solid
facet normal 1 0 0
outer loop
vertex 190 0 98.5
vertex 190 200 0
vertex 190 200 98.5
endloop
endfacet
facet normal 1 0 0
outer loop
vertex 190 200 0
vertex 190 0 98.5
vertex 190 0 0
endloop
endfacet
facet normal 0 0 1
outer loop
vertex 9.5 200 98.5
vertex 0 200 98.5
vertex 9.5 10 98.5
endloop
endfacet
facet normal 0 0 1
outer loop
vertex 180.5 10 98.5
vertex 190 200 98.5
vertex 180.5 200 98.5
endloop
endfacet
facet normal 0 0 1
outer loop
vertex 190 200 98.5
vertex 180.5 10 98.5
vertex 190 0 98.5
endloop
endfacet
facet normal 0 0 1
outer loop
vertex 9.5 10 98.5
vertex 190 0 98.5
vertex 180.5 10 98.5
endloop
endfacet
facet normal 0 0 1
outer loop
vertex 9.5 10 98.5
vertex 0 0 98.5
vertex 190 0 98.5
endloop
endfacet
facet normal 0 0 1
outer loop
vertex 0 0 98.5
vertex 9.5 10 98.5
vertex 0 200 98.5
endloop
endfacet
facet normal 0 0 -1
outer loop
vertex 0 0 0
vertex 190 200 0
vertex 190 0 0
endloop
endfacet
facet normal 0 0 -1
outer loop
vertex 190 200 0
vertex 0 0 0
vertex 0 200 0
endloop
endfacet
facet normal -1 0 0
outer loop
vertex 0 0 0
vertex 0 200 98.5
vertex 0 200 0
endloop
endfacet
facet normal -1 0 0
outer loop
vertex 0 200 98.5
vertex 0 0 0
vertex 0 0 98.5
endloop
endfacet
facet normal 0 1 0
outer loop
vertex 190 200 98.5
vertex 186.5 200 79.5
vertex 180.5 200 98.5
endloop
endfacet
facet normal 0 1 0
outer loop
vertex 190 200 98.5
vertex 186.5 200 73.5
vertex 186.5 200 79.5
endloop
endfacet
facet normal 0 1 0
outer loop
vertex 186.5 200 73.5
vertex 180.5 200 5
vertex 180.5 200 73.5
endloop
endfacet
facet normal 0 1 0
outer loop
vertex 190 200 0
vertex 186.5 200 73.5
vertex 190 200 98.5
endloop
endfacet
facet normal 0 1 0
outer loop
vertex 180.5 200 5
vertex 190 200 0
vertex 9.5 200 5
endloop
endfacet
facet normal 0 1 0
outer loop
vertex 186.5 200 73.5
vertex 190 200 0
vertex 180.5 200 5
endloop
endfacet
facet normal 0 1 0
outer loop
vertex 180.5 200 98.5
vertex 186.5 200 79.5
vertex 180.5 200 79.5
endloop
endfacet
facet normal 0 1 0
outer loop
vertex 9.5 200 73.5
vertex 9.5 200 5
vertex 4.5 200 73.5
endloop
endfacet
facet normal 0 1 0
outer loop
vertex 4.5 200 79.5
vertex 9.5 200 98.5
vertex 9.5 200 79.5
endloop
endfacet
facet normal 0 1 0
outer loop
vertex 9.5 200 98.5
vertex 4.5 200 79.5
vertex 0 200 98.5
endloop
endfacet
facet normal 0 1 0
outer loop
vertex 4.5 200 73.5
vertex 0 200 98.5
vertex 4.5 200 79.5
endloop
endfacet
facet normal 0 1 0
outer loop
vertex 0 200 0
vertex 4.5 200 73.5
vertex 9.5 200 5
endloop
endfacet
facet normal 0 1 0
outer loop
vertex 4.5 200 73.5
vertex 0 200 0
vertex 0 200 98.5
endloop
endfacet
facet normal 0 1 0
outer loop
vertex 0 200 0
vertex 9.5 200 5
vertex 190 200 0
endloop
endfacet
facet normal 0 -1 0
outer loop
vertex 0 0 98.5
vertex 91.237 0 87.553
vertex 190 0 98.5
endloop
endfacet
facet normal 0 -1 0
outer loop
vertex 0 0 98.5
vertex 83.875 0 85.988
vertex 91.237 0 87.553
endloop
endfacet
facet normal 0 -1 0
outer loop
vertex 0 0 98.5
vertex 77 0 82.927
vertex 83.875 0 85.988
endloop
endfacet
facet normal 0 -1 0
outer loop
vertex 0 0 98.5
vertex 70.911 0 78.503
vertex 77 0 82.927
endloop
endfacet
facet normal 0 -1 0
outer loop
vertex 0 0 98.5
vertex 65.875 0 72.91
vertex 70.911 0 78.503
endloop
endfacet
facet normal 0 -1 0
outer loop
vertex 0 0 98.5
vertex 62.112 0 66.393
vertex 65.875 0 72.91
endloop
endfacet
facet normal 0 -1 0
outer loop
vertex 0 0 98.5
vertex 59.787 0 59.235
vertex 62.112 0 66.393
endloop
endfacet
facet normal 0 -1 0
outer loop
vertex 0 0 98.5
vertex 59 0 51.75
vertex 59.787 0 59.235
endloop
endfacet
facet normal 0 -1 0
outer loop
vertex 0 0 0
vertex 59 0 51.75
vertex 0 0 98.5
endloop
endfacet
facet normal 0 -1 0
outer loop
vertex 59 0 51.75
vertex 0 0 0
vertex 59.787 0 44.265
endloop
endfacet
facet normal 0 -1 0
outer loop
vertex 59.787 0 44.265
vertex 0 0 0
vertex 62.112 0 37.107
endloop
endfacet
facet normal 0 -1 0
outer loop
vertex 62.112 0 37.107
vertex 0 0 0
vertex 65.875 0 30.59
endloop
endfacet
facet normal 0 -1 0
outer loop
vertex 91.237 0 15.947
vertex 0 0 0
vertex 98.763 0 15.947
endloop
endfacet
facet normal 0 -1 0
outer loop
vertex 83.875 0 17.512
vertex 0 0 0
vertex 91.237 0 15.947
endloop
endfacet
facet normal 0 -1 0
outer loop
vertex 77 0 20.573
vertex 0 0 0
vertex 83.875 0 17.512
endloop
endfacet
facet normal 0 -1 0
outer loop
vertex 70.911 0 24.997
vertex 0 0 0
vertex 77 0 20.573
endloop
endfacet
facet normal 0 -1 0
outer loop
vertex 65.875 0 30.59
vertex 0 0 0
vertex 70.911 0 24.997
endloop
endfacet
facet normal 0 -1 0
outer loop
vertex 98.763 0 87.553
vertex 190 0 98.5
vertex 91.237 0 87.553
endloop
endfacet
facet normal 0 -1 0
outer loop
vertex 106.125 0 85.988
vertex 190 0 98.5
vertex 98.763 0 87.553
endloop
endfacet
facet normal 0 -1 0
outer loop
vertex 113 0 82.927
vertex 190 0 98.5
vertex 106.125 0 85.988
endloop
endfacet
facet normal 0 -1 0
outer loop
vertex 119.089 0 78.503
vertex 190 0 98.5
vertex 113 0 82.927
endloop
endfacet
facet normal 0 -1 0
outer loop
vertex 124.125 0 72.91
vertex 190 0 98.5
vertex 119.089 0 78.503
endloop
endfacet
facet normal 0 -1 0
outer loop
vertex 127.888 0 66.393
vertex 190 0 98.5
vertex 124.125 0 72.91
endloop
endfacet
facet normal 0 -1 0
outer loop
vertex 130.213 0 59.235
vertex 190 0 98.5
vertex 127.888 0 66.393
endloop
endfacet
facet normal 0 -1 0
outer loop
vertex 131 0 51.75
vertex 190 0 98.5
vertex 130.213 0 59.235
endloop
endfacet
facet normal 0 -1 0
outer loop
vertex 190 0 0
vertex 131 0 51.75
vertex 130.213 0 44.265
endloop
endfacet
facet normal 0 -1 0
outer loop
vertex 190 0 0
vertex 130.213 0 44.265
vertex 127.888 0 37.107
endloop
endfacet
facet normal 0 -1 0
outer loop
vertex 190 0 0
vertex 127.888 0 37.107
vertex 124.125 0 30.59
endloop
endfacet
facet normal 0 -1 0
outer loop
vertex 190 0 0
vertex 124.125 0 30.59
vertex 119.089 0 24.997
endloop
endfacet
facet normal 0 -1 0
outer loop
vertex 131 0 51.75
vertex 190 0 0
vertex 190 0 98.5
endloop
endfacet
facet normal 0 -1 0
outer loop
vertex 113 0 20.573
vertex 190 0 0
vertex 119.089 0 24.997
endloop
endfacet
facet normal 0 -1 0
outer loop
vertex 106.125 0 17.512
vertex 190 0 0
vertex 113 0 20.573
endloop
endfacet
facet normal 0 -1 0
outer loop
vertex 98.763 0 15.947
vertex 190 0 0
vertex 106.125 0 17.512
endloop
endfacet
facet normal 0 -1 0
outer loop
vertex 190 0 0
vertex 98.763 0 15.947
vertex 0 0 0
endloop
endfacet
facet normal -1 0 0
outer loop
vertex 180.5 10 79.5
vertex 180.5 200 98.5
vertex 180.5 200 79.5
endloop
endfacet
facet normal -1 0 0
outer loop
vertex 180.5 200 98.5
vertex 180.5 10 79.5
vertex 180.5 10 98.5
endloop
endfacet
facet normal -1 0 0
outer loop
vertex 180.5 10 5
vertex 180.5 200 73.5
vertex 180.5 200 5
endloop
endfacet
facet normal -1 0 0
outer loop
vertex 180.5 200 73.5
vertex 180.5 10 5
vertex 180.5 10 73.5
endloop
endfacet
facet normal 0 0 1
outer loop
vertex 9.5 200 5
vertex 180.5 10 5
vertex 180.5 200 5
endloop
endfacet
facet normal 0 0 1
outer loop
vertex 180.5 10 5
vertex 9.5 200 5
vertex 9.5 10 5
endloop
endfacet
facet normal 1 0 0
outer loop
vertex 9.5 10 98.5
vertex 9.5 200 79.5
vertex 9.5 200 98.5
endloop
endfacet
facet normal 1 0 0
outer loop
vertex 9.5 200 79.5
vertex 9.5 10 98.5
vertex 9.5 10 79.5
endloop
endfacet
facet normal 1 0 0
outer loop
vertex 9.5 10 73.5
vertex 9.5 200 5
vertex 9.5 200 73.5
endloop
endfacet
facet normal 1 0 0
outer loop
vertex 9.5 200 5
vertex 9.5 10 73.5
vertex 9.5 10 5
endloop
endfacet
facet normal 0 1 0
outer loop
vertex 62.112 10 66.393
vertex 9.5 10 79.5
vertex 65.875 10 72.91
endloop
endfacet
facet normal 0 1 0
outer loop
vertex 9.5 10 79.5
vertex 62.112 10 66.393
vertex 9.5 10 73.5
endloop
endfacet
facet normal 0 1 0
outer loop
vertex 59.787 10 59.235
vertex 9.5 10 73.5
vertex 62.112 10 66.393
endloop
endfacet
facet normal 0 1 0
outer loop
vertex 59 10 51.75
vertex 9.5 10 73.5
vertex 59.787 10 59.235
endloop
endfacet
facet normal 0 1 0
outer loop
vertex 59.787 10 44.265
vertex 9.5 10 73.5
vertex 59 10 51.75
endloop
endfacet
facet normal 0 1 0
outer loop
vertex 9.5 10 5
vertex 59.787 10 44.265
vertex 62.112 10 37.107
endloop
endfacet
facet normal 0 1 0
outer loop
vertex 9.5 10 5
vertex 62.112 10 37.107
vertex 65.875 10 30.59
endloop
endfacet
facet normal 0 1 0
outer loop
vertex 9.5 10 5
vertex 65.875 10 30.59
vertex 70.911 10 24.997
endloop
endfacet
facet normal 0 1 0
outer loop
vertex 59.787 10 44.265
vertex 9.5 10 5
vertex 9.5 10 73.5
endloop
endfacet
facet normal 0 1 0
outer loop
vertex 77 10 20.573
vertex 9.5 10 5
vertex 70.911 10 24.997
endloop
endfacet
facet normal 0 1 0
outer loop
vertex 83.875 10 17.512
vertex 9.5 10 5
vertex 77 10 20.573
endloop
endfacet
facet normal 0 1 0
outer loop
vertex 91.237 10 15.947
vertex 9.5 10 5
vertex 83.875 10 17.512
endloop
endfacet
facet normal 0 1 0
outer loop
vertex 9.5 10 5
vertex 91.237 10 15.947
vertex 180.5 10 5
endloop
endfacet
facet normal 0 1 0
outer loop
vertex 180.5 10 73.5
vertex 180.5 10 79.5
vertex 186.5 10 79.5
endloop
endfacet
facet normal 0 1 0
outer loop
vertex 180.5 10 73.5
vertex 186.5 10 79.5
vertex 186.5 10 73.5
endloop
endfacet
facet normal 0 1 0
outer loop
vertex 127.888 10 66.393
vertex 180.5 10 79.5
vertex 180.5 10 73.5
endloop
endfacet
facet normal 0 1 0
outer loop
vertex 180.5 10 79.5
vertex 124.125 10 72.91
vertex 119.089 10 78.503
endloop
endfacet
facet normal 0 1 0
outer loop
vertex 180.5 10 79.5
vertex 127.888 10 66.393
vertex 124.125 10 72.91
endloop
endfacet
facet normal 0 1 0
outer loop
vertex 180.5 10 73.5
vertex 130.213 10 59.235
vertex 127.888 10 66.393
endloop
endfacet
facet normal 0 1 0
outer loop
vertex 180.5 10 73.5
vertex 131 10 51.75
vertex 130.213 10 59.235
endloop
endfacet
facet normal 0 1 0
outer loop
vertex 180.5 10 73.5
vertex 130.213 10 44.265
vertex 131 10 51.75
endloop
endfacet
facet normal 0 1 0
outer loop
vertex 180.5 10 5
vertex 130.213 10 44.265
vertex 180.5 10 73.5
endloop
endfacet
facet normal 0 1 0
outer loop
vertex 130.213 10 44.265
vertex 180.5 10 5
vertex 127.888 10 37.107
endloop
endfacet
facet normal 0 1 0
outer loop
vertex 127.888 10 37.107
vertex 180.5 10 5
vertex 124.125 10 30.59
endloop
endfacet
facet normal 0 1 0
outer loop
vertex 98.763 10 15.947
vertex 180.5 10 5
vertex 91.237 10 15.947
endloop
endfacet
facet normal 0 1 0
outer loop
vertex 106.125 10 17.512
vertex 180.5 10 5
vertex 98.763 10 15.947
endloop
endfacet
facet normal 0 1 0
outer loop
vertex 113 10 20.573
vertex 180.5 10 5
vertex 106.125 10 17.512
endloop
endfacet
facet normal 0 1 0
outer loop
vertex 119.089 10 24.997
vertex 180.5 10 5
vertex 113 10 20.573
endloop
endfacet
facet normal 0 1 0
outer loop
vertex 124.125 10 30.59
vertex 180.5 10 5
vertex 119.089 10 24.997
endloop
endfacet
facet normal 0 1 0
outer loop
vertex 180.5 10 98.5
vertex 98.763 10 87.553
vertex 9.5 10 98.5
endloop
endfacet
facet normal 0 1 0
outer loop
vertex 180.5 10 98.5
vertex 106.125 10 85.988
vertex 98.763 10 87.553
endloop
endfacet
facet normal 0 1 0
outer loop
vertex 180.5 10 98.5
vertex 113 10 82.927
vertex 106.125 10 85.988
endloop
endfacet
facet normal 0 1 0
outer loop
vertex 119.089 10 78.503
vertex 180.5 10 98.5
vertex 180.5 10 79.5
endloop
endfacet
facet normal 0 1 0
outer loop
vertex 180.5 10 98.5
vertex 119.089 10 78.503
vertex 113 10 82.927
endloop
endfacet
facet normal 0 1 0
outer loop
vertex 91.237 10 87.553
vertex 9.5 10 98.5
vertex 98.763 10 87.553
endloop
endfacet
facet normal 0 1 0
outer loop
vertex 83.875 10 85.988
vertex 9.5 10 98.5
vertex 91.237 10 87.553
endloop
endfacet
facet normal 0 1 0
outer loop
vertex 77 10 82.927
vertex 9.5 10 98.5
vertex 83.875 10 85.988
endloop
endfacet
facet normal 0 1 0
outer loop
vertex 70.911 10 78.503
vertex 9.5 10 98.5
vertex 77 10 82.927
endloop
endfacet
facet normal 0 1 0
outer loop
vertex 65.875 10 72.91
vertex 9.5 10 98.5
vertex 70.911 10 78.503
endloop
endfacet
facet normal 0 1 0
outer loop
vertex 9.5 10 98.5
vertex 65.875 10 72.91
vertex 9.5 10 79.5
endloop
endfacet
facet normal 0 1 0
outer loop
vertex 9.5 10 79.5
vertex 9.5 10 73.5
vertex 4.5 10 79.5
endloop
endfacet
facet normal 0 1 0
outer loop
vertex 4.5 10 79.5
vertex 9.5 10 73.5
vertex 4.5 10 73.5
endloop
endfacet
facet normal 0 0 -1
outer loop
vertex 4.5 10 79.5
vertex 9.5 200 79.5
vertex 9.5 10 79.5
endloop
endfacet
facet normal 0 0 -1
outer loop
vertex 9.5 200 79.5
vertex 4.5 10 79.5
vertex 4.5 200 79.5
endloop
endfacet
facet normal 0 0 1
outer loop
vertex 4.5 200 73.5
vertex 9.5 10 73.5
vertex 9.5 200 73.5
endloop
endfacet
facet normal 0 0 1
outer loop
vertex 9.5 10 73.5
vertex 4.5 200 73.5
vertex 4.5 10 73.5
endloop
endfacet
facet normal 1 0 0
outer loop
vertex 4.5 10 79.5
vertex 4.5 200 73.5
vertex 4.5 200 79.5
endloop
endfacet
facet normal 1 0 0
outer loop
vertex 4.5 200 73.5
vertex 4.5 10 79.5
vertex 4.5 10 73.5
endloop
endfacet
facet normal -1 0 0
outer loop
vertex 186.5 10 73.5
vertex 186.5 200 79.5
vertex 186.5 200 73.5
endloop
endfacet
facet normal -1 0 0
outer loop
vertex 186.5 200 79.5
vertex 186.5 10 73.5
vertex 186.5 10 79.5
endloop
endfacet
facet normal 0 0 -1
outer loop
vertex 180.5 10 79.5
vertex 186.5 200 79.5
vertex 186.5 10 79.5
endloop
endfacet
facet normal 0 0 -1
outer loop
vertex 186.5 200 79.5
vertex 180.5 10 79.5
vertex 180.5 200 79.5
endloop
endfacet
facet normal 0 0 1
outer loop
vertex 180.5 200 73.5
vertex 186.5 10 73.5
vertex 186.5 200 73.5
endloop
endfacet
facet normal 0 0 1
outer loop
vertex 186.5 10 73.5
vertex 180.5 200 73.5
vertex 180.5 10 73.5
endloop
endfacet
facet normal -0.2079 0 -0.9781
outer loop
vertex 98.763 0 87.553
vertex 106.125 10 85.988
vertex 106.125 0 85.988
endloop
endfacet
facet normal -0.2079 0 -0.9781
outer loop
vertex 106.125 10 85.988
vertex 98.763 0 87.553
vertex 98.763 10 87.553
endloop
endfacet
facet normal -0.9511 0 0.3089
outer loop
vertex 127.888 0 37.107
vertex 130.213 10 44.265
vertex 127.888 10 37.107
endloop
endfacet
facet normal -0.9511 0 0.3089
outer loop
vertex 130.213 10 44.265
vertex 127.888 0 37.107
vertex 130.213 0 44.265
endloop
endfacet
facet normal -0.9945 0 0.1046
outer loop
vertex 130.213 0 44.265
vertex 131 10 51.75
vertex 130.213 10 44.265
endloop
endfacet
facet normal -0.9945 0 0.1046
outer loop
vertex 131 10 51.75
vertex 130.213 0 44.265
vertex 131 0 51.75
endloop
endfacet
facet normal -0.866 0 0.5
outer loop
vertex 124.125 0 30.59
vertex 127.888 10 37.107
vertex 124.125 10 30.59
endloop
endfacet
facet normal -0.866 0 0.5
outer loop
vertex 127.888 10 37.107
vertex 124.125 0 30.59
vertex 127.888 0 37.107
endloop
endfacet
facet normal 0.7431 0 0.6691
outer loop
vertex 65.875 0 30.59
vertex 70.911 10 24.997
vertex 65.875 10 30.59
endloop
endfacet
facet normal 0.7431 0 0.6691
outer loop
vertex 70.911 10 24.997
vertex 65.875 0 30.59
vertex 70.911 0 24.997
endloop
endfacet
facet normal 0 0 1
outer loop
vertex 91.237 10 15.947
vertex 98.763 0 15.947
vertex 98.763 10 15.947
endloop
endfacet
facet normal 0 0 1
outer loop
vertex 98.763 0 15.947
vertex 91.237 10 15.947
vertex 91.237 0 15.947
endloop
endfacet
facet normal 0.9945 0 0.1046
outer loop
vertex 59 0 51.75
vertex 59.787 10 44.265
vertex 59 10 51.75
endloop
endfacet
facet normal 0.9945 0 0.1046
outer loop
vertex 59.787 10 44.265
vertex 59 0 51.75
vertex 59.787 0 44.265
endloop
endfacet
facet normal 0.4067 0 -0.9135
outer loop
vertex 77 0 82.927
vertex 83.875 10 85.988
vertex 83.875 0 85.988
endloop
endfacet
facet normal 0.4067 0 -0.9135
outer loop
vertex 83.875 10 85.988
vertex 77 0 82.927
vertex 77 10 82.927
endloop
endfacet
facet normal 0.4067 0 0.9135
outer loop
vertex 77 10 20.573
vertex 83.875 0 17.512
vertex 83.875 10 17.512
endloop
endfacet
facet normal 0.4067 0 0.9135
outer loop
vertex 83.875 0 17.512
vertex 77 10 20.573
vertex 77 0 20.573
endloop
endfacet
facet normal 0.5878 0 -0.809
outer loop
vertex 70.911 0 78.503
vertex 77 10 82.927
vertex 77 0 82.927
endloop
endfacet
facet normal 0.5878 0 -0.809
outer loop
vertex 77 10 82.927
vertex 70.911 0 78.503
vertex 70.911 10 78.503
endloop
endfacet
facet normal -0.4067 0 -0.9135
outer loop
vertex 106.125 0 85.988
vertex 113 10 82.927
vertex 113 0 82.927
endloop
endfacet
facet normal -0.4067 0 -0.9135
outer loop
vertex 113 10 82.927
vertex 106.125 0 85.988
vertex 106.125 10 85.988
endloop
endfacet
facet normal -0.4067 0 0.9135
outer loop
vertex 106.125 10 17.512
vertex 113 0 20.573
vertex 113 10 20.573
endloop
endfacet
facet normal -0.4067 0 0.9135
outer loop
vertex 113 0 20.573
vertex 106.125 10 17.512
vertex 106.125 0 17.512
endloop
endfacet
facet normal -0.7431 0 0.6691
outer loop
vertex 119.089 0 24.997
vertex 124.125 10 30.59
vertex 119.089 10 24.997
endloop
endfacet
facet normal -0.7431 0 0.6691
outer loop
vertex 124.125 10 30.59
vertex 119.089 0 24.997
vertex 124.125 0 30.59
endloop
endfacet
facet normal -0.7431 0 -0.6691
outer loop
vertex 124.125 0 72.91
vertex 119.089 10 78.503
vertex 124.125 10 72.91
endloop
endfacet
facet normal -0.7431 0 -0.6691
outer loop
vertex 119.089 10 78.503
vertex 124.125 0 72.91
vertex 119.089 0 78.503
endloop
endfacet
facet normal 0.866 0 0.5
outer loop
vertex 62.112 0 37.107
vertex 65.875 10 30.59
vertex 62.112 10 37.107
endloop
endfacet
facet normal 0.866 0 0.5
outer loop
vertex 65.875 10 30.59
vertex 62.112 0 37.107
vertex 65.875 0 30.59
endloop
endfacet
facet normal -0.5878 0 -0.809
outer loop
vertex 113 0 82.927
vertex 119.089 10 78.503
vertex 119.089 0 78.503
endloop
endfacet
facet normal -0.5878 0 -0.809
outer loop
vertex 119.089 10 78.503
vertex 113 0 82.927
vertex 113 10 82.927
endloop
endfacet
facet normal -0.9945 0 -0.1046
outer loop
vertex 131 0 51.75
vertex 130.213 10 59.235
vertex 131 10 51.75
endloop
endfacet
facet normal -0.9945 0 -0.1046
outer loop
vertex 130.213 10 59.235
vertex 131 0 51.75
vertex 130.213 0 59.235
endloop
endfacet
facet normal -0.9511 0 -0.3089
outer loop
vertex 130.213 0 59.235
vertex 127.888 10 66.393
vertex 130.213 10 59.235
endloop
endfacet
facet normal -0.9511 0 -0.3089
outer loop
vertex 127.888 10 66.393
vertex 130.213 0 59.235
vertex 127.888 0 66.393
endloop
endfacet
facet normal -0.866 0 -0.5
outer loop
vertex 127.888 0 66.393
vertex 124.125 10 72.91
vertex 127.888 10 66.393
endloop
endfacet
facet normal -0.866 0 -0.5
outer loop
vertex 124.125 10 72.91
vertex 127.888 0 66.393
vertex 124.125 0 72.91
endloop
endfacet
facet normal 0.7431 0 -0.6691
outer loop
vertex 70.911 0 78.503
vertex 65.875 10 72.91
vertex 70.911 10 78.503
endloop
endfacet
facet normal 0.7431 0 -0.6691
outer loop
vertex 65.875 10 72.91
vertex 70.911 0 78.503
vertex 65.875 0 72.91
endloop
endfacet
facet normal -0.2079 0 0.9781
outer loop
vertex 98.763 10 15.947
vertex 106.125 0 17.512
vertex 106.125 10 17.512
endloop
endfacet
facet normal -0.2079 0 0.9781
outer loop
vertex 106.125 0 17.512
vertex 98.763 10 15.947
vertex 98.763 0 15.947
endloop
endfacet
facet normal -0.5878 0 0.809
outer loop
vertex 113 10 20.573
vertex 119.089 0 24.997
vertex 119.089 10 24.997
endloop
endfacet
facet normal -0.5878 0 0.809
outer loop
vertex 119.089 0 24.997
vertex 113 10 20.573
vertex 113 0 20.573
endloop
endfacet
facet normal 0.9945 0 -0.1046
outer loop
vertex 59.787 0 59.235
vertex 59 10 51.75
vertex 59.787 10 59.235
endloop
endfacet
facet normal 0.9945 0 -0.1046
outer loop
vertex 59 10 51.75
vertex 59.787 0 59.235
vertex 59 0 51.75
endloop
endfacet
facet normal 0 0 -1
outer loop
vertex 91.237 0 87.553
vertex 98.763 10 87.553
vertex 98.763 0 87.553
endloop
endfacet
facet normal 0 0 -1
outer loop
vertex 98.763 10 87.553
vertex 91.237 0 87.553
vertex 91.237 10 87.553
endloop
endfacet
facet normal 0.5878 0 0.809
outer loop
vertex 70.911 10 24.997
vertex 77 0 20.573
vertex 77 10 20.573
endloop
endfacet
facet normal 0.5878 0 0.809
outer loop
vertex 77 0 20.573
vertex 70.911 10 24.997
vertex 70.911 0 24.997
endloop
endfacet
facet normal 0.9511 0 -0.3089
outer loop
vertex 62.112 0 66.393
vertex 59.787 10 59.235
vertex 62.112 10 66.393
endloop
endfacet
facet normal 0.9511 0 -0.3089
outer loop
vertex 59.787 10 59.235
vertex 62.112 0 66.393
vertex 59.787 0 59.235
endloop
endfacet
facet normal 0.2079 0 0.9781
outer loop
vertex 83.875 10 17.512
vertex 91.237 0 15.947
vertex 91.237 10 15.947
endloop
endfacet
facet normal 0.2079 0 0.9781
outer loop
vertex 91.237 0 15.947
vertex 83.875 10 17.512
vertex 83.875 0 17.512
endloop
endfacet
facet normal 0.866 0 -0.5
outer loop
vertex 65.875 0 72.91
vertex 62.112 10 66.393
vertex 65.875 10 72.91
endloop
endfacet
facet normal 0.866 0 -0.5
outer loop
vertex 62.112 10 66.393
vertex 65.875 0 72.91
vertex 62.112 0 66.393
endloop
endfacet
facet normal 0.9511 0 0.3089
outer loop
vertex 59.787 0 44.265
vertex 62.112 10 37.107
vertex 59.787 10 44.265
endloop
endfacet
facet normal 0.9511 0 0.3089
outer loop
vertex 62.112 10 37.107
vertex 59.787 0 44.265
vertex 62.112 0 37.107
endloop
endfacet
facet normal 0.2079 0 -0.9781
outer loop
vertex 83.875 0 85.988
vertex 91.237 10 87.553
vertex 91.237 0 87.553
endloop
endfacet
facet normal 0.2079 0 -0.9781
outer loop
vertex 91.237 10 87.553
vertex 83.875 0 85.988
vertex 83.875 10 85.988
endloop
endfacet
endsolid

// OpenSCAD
//Customisable Box mobile projector from Saurabh Karanke
//Enter mobile dimensions 
//Enter mobile length
length=150;
//Enter mobile width
width=73.5;
//Enter mobile thickness
thickness=9.5;
daimeter=72;//[50:72]
l=length+20;l1=length-2;l2=length+2;
w=width+20;w1=width+9;w2=width+11;
t=20;//[20:20]
tl=thickness+2;
t1=18-tl;
module box(){
    difference(){
cube([l+20,200,w+5]);
    translate([9.5,10,5])
cube([l+1,190,w]);
    translate([4.5,10,width])
cube([6,190,6]);
    translate([l+10.5,10,width])
cube([6,190,6]);
        translate([l/2+10,0,width/2+15])
        rotate([-90,0,0])
cylinder(10,daimeter/2,daimeter/2);
 }
 }
 box();
